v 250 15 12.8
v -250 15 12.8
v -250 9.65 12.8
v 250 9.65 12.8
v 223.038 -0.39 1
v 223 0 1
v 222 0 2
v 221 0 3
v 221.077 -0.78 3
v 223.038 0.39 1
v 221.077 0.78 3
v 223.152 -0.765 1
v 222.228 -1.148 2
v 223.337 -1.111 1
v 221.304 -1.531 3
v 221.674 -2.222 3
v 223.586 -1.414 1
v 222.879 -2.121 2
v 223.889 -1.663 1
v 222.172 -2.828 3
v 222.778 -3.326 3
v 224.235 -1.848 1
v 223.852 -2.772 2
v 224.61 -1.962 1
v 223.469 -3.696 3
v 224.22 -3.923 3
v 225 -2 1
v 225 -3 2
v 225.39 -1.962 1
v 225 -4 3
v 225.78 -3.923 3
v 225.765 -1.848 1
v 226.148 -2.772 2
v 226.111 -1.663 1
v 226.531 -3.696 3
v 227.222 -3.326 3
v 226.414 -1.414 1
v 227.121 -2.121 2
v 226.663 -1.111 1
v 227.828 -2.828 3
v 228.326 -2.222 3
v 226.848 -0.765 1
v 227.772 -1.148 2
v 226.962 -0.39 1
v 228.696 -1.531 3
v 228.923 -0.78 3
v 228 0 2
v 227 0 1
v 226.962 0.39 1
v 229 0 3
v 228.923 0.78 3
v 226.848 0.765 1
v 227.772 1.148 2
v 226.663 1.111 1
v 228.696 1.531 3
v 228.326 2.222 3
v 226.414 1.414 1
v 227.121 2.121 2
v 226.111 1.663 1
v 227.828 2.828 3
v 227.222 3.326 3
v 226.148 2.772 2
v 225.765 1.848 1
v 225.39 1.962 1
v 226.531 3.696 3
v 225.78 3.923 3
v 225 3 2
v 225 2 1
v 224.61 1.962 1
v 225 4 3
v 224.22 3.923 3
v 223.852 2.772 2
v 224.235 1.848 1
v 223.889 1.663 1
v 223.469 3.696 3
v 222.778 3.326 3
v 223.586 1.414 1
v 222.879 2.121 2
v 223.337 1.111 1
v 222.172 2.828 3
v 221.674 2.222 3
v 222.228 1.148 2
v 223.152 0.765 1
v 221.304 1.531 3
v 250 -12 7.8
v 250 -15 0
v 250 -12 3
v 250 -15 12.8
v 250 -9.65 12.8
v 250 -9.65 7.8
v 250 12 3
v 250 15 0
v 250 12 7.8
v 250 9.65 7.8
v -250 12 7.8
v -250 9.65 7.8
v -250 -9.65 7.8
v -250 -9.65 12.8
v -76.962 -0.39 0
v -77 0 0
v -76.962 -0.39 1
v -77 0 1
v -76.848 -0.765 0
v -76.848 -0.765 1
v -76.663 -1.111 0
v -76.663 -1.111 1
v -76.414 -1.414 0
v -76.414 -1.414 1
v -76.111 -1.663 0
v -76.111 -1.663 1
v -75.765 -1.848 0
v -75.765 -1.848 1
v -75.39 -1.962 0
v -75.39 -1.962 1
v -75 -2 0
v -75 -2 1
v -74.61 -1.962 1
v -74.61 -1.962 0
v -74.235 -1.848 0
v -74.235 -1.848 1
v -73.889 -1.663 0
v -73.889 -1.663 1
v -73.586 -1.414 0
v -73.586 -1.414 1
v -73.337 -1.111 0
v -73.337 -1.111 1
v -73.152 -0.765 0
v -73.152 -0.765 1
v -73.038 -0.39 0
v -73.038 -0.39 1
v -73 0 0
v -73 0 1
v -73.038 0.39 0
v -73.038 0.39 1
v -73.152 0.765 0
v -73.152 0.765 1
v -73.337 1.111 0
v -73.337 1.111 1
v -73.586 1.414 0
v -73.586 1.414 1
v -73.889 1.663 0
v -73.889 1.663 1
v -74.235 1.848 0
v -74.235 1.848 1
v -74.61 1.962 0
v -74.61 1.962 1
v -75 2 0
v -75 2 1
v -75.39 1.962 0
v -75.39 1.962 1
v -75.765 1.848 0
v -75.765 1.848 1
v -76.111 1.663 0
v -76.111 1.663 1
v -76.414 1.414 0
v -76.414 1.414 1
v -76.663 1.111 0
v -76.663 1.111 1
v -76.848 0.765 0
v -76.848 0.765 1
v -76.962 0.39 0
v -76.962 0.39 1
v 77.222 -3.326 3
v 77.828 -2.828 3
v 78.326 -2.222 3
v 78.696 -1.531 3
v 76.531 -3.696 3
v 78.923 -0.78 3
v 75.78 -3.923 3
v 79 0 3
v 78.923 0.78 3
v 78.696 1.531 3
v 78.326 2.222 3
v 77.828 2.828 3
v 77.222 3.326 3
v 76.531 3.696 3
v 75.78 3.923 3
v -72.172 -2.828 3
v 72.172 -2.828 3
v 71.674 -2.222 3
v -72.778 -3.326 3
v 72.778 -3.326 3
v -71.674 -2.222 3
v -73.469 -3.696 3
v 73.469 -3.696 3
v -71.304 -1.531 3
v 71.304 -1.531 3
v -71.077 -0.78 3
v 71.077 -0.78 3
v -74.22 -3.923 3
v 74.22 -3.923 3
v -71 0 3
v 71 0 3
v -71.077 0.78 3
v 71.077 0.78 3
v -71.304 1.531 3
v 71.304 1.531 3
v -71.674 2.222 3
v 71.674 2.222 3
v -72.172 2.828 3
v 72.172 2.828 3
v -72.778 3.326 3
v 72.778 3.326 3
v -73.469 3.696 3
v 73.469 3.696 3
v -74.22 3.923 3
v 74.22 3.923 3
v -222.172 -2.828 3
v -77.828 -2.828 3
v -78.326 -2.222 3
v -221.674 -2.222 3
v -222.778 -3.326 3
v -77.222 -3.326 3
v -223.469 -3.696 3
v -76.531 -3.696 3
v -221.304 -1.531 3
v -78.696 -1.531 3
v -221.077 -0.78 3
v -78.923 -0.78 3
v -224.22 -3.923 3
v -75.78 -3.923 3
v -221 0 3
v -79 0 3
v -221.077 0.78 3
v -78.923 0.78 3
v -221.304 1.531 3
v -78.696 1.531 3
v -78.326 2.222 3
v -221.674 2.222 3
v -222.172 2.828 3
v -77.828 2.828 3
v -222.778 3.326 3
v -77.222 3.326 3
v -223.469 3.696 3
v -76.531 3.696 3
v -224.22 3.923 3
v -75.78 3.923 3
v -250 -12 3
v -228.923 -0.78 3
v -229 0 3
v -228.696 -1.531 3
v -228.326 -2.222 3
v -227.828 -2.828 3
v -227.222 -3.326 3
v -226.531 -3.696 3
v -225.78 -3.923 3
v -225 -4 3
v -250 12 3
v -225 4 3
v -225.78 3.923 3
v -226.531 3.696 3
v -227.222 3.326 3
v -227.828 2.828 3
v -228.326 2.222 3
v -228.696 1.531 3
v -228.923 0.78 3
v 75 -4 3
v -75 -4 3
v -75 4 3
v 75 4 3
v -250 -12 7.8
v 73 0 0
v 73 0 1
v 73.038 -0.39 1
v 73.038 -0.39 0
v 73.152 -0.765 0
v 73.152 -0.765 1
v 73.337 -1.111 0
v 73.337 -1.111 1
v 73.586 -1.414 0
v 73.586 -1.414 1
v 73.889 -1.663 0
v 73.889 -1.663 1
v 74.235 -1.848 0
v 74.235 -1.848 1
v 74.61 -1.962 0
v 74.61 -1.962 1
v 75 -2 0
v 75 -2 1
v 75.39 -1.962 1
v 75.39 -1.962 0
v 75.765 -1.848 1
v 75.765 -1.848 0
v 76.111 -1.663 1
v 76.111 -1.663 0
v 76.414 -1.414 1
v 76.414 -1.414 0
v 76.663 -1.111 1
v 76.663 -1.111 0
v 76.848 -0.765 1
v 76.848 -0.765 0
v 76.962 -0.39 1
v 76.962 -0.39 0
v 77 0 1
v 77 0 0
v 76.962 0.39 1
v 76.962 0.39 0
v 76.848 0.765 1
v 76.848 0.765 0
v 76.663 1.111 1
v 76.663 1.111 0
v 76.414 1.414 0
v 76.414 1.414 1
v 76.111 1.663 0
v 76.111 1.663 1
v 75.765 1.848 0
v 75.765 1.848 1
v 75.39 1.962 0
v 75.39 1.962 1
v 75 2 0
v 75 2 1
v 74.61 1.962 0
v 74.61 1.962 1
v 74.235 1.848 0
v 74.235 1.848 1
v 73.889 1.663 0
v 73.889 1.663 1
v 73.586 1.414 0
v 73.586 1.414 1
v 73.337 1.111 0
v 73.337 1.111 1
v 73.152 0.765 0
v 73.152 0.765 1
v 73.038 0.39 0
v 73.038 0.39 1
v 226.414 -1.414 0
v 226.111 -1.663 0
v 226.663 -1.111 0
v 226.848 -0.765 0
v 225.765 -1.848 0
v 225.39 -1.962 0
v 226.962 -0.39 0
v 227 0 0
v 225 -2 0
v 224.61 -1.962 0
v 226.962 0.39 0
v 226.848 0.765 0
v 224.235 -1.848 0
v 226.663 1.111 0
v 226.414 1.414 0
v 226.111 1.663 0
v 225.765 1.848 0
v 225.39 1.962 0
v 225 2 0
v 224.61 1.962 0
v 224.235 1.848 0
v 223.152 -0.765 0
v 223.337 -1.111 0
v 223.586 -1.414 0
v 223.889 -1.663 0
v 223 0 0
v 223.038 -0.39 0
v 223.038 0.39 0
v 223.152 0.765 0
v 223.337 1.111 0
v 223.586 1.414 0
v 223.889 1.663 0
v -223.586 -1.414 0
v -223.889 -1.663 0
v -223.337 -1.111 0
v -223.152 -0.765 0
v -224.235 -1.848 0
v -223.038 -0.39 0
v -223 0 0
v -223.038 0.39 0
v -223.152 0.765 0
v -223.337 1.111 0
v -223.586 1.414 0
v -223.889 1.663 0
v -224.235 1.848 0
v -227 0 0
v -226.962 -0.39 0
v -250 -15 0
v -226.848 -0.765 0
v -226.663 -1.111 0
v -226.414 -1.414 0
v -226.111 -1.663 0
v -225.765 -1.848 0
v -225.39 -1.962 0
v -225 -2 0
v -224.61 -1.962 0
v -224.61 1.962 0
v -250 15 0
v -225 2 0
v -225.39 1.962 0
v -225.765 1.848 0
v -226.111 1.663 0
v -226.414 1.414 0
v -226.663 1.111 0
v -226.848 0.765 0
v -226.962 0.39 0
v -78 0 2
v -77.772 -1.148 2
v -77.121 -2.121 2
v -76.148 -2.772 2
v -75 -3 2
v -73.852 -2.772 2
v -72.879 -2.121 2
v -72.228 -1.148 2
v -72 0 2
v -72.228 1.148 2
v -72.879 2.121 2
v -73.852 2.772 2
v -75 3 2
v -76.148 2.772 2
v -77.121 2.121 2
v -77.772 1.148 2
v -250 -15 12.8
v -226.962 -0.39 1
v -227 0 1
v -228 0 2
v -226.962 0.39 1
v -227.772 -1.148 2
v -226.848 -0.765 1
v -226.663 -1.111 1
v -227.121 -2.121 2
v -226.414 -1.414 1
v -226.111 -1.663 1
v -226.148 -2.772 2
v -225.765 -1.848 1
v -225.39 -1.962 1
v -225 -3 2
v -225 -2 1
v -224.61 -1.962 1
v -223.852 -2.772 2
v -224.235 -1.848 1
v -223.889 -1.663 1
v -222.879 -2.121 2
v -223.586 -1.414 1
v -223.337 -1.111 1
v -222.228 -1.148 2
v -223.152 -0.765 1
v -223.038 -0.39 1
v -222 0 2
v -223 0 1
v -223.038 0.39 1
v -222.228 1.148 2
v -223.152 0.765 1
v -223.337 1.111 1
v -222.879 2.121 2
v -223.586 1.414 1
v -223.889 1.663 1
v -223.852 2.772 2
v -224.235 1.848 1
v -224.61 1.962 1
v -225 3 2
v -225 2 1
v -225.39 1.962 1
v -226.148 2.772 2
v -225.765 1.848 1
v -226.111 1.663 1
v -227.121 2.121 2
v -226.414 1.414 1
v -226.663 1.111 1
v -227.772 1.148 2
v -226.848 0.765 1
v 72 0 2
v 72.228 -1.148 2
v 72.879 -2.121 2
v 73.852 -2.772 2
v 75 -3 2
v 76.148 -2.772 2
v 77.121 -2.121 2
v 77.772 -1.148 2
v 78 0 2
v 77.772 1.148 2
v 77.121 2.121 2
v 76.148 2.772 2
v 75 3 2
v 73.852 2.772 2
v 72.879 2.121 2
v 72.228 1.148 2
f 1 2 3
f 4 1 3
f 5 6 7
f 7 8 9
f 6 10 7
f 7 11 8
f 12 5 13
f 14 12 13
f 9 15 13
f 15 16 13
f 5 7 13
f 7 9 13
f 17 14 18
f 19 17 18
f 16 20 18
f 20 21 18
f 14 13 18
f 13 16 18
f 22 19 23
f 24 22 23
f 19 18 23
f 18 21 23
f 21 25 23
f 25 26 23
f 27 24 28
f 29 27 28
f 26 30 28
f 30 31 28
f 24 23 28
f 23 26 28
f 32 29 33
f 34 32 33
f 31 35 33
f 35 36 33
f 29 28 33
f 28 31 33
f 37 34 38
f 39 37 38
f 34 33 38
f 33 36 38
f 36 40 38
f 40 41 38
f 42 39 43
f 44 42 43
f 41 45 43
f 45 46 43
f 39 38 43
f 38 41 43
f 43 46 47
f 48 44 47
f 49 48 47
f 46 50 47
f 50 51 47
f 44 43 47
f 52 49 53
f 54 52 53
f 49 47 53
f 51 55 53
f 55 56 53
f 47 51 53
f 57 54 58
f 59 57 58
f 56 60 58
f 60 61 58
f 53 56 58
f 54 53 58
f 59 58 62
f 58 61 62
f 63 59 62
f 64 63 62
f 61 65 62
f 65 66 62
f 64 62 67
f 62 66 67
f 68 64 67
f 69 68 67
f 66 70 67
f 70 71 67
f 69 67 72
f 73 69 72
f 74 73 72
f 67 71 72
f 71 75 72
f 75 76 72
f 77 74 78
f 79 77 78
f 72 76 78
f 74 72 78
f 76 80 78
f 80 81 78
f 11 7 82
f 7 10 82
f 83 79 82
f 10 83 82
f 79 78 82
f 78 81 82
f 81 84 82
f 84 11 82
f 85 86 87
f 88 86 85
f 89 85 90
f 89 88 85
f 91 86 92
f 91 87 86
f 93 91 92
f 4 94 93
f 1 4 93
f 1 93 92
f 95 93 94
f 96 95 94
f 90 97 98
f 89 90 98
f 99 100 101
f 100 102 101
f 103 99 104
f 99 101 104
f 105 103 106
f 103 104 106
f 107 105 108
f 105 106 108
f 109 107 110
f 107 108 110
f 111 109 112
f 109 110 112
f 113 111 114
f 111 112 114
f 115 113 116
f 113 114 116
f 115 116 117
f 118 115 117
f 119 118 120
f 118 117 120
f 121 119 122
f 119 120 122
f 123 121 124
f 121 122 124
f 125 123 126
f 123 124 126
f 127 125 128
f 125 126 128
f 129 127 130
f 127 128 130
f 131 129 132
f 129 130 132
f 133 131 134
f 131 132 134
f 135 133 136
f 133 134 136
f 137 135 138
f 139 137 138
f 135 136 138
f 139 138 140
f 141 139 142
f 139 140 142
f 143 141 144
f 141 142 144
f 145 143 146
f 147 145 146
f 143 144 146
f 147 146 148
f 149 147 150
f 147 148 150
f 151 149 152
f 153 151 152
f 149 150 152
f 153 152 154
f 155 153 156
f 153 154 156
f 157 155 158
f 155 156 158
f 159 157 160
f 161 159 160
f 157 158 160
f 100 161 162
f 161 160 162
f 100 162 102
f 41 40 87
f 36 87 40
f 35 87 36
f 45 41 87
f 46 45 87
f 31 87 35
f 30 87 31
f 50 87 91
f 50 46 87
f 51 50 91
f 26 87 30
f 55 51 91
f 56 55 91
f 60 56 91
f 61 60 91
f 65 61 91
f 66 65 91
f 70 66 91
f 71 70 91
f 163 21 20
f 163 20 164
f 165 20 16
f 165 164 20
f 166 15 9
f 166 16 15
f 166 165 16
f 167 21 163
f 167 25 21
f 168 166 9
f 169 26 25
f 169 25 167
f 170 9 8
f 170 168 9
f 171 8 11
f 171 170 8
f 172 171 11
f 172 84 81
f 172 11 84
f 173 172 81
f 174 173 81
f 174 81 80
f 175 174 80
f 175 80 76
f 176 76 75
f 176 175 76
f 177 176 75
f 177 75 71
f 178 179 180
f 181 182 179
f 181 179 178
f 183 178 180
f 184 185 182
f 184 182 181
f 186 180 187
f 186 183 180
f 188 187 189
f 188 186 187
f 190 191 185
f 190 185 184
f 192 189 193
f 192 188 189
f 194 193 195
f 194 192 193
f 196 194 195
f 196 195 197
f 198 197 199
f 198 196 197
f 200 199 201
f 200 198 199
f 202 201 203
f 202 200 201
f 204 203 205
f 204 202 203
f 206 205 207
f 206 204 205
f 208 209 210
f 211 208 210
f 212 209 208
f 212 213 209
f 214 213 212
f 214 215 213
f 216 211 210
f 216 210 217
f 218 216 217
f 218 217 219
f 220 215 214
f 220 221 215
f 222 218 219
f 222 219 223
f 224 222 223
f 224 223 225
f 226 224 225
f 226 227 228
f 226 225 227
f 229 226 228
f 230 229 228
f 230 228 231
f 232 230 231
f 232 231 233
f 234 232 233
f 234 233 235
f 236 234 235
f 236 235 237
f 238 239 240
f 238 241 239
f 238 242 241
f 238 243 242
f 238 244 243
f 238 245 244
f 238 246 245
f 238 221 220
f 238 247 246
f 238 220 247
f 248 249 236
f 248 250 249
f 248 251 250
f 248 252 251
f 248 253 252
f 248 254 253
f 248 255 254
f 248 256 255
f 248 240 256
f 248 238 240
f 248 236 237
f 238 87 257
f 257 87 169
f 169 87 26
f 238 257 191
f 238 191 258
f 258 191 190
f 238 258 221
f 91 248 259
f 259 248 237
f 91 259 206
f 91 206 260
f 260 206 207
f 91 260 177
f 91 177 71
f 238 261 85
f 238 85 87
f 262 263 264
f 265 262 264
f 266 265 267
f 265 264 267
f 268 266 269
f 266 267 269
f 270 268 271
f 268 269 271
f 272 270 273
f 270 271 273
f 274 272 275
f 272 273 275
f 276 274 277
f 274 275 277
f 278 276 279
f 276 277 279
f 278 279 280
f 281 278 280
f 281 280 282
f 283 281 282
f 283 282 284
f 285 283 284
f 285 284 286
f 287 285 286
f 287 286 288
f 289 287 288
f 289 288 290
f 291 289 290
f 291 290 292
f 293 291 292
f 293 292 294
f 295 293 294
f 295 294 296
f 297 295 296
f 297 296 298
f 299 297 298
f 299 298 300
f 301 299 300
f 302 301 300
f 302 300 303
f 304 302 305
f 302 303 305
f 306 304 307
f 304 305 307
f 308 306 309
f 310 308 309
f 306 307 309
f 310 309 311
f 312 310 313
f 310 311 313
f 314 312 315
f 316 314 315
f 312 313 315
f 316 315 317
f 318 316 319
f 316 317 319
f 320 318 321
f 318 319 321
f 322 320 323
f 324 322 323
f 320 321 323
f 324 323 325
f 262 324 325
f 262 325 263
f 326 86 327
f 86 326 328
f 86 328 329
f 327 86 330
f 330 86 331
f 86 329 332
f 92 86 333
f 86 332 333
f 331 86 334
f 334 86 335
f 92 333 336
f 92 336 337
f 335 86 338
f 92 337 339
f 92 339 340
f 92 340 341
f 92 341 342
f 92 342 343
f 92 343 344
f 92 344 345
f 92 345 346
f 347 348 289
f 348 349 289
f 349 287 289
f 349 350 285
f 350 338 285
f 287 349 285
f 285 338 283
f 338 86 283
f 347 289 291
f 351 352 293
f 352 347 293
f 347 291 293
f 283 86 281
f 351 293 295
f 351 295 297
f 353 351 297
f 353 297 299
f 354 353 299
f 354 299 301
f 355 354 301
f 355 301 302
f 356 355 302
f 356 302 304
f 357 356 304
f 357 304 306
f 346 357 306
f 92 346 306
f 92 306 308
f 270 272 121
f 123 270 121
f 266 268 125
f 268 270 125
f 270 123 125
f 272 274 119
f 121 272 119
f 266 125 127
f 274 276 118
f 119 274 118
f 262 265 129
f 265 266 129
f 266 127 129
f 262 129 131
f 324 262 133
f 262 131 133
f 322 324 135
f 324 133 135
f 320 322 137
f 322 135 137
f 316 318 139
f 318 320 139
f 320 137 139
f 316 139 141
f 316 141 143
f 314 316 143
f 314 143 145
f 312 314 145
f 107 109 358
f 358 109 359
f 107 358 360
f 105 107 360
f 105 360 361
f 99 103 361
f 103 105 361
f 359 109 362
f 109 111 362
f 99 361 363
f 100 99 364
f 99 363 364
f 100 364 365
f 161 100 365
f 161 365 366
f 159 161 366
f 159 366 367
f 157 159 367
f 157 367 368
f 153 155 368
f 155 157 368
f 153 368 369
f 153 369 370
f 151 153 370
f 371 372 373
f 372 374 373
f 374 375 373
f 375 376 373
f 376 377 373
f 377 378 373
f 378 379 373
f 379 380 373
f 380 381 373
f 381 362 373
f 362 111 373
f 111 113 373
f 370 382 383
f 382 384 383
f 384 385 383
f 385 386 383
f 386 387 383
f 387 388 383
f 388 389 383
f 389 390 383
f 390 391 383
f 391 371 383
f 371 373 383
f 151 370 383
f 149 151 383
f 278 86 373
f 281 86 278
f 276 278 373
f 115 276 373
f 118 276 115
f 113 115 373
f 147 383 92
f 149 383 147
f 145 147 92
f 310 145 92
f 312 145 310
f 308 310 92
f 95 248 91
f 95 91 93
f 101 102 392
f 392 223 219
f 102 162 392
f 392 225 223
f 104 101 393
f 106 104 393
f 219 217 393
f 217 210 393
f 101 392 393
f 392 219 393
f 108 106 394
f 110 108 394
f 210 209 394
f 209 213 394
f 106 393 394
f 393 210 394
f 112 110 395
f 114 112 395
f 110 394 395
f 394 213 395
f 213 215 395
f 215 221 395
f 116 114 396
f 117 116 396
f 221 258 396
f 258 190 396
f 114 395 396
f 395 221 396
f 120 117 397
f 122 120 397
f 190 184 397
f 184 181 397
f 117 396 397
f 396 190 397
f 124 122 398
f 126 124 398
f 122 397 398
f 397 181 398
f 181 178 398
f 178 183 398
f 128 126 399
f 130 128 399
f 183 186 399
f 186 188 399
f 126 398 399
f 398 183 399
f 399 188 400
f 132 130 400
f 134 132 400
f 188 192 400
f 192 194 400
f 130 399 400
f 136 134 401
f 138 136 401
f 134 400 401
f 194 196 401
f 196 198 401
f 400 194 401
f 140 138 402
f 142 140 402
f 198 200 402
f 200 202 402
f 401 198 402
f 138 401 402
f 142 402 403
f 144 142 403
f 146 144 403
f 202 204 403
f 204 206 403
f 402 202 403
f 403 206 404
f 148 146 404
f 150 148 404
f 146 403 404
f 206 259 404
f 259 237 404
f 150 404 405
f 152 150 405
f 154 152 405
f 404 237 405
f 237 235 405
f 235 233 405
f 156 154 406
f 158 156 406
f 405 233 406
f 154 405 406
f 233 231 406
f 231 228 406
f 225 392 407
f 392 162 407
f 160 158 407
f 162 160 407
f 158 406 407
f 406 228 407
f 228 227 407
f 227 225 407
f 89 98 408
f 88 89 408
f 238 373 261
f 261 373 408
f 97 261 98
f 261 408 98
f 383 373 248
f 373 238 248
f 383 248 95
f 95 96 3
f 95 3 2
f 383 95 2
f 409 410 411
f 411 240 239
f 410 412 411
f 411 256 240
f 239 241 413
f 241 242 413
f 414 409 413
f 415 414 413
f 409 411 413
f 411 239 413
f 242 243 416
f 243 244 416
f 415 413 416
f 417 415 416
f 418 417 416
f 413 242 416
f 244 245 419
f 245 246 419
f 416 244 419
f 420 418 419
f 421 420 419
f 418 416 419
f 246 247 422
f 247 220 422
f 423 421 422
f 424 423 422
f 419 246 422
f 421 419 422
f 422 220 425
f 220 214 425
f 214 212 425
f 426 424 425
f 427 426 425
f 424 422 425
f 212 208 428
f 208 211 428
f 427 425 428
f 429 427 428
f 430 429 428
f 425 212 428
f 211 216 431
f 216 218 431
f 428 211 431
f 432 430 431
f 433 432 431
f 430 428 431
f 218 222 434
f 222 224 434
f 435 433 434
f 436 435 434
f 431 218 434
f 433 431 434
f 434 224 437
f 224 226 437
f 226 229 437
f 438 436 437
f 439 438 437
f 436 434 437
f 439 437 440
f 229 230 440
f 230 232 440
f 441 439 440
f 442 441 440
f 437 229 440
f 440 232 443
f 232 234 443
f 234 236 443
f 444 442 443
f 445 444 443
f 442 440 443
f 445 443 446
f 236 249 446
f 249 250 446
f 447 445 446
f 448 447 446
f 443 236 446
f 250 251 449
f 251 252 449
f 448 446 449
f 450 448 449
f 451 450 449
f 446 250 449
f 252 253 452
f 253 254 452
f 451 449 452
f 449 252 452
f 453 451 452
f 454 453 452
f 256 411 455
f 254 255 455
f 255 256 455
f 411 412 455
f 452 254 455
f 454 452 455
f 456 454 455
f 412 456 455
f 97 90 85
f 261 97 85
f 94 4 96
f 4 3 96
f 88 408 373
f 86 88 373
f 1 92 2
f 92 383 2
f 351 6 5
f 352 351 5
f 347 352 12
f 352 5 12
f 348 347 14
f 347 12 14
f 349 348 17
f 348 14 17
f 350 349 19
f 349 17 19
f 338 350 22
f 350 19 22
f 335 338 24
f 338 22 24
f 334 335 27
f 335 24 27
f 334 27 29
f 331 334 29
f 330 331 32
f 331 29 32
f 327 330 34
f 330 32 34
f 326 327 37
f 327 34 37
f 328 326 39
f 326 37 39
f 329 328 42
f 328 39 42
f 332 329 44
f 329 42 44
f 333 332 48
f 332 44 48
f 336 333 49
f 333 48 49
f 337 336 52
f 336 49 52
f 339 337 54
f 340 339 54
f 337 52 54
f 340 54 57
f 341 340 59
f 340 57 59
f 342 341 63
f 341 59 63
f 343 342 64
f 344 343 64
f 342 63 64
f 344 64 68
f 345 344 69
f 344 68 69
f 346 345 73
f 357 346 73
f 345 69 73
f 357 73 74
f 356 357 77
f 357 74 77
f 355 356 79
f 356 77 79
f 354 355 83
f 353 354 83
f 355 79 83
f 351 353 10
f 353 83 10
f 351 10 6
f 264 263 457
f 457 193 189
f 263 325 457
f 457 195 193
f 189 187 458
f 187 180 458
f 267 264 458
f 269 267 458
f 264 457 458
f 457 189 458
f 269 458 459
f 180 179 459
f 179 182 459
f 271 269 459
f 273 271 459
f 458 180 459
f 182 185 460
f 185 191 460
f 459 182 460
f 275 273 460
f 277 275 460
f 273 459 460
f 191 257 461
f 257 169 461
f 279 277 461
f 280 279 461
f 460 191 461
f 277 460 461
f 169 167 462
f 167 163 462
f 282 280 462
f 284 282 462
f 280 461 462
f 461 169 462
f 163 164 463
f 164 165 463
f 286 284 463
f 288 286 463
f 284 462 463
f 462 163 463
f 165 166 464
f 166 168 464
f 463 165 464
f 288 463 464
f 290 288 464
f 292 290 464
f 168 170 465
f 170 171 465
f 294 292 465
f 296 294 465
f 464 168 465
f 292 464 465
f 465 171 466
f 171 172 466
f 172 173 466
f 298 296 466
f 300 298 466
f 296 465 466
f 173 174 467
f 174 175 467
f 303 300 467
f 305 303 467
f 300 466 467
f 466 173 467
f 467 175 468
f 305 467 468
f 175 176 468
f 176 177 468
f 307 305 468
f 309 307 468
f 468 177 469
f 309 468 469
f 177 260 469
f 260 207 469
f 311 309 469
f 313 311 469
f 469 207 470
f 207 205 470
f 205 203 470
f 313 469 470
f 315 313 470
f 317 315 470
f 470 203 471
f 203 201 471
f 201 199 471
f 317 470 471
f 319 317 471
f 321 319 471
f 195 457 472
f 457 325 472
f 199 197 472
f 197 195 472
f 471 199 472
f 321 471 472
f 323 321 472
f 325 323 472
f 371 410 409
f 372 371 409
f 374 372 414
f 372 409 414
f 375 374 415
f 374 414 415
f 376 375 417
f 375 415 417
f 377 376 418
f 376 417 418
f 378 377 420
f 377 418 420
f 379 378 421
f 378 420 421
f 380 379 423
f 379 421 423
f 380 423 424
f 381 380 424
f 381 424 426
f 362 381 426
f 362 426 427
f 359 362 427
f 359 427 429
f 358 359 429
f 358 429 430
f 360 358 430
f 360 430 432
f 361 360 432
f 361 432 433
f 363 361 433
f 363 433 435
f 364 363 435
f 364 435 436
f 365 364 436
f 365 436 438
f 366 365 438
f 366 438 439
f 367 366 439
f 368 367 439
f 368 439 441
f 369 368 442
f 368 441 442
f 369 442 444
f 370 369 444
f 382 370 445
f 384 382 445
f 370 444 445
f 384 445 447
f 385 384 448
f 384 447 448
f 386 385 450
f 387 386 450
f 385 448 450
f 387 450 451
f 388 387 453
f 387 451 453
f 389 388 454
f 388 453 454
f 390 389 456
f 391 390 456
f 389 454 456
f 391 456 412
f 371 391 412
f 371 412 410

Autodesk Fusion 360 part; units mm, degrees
sketch "T-track" plane through (0, 0, 0) normal (1, 0, 0) x (0, 1, 0)
  line L0 (-15, 0) -> (15, 0)
  line L1 (15, 0) -> (15, 12.8)
  line L2 (-15, 12.8) -> (-15, 0)
  line L3 (9.65, 12.8) -> (9.65, 7.8)
  line L4 (-9.65, 7.8) -> (-9.65, 12.8)
  line L5 (-12, 7.8) -> (-12, 3)
  line L6 (-12, 3) -> (12, 3)
  line L7 (12, 3) -> (12, 7.8)
  line L8 (15, 12.8) -> (9.65, 12.8)
  line L9 (-9.65, 12.8) -> (-15, 12.8)
  line L10 (12, 7.8) -> (9.65, 7.8)
  line L11 (-9.65, 7.8) -> (-12, 7.8)
  dimension "d1" = 30
  dimension "d2" = 12.8
  dimension "d3" = 19.3
  dimension "d4" = 5
  dimension "d5" = 9.65
  dimension "d6" = 24
  dimension "d7" = 4.8
  dimension "d8" = 12
extrude "Extrude1" add sketch "T-track" along normal mid plane 500
sketch "Holes" plane through (0, 0, 3) normal (0, 0, 1) x (-1, 0, 0)
  line L0 (250, 12) -> (-250, 12)
  line L1 (-250, 12) -> (-250, -12)
  line L2 (-250, -12) -> (250, -12)
  line L3 (250, -12) -> (250, 12)
  line L4 (250, 0) -> (-250, 0) construction
  circle A0 centre (225, 0) radius 2
  circle A1 centre (-225, 0) radius 2
  circle A2 centre (-75, 0) radius 2
  circle A3 centre (75, 0) radius 2
  dimension "d12" = 4
  dimension "d13" = 4
  dimension "d14" = 25
  dimension "d22" = 4
  dimension "d23" = 4
  dimension "d24" = 150
  dimension "d25" = 150
  dimension "d26" = 150
  dimension "d27" = 25
extrude "Extrude2" cut sketch "Holes" against normal through all contours A0 | A1 | A2 | A3
chamfer "Chamfer2" distance 2 angle 45 4 edges at (226.8647, -0.7232, 3) (76.8647, -0.7232, 3) (-73.1353, -0.7232, 3) (-223.1353, -0.7232, 3)
equation "d5 = ( 19.3 / 2 ) * 1 mm"
equation "d8 = ( 24 / 2 ) * 1 mm"
equation "d12 = d13"
equation "d22 = d13"
equation "d23 = d13"
